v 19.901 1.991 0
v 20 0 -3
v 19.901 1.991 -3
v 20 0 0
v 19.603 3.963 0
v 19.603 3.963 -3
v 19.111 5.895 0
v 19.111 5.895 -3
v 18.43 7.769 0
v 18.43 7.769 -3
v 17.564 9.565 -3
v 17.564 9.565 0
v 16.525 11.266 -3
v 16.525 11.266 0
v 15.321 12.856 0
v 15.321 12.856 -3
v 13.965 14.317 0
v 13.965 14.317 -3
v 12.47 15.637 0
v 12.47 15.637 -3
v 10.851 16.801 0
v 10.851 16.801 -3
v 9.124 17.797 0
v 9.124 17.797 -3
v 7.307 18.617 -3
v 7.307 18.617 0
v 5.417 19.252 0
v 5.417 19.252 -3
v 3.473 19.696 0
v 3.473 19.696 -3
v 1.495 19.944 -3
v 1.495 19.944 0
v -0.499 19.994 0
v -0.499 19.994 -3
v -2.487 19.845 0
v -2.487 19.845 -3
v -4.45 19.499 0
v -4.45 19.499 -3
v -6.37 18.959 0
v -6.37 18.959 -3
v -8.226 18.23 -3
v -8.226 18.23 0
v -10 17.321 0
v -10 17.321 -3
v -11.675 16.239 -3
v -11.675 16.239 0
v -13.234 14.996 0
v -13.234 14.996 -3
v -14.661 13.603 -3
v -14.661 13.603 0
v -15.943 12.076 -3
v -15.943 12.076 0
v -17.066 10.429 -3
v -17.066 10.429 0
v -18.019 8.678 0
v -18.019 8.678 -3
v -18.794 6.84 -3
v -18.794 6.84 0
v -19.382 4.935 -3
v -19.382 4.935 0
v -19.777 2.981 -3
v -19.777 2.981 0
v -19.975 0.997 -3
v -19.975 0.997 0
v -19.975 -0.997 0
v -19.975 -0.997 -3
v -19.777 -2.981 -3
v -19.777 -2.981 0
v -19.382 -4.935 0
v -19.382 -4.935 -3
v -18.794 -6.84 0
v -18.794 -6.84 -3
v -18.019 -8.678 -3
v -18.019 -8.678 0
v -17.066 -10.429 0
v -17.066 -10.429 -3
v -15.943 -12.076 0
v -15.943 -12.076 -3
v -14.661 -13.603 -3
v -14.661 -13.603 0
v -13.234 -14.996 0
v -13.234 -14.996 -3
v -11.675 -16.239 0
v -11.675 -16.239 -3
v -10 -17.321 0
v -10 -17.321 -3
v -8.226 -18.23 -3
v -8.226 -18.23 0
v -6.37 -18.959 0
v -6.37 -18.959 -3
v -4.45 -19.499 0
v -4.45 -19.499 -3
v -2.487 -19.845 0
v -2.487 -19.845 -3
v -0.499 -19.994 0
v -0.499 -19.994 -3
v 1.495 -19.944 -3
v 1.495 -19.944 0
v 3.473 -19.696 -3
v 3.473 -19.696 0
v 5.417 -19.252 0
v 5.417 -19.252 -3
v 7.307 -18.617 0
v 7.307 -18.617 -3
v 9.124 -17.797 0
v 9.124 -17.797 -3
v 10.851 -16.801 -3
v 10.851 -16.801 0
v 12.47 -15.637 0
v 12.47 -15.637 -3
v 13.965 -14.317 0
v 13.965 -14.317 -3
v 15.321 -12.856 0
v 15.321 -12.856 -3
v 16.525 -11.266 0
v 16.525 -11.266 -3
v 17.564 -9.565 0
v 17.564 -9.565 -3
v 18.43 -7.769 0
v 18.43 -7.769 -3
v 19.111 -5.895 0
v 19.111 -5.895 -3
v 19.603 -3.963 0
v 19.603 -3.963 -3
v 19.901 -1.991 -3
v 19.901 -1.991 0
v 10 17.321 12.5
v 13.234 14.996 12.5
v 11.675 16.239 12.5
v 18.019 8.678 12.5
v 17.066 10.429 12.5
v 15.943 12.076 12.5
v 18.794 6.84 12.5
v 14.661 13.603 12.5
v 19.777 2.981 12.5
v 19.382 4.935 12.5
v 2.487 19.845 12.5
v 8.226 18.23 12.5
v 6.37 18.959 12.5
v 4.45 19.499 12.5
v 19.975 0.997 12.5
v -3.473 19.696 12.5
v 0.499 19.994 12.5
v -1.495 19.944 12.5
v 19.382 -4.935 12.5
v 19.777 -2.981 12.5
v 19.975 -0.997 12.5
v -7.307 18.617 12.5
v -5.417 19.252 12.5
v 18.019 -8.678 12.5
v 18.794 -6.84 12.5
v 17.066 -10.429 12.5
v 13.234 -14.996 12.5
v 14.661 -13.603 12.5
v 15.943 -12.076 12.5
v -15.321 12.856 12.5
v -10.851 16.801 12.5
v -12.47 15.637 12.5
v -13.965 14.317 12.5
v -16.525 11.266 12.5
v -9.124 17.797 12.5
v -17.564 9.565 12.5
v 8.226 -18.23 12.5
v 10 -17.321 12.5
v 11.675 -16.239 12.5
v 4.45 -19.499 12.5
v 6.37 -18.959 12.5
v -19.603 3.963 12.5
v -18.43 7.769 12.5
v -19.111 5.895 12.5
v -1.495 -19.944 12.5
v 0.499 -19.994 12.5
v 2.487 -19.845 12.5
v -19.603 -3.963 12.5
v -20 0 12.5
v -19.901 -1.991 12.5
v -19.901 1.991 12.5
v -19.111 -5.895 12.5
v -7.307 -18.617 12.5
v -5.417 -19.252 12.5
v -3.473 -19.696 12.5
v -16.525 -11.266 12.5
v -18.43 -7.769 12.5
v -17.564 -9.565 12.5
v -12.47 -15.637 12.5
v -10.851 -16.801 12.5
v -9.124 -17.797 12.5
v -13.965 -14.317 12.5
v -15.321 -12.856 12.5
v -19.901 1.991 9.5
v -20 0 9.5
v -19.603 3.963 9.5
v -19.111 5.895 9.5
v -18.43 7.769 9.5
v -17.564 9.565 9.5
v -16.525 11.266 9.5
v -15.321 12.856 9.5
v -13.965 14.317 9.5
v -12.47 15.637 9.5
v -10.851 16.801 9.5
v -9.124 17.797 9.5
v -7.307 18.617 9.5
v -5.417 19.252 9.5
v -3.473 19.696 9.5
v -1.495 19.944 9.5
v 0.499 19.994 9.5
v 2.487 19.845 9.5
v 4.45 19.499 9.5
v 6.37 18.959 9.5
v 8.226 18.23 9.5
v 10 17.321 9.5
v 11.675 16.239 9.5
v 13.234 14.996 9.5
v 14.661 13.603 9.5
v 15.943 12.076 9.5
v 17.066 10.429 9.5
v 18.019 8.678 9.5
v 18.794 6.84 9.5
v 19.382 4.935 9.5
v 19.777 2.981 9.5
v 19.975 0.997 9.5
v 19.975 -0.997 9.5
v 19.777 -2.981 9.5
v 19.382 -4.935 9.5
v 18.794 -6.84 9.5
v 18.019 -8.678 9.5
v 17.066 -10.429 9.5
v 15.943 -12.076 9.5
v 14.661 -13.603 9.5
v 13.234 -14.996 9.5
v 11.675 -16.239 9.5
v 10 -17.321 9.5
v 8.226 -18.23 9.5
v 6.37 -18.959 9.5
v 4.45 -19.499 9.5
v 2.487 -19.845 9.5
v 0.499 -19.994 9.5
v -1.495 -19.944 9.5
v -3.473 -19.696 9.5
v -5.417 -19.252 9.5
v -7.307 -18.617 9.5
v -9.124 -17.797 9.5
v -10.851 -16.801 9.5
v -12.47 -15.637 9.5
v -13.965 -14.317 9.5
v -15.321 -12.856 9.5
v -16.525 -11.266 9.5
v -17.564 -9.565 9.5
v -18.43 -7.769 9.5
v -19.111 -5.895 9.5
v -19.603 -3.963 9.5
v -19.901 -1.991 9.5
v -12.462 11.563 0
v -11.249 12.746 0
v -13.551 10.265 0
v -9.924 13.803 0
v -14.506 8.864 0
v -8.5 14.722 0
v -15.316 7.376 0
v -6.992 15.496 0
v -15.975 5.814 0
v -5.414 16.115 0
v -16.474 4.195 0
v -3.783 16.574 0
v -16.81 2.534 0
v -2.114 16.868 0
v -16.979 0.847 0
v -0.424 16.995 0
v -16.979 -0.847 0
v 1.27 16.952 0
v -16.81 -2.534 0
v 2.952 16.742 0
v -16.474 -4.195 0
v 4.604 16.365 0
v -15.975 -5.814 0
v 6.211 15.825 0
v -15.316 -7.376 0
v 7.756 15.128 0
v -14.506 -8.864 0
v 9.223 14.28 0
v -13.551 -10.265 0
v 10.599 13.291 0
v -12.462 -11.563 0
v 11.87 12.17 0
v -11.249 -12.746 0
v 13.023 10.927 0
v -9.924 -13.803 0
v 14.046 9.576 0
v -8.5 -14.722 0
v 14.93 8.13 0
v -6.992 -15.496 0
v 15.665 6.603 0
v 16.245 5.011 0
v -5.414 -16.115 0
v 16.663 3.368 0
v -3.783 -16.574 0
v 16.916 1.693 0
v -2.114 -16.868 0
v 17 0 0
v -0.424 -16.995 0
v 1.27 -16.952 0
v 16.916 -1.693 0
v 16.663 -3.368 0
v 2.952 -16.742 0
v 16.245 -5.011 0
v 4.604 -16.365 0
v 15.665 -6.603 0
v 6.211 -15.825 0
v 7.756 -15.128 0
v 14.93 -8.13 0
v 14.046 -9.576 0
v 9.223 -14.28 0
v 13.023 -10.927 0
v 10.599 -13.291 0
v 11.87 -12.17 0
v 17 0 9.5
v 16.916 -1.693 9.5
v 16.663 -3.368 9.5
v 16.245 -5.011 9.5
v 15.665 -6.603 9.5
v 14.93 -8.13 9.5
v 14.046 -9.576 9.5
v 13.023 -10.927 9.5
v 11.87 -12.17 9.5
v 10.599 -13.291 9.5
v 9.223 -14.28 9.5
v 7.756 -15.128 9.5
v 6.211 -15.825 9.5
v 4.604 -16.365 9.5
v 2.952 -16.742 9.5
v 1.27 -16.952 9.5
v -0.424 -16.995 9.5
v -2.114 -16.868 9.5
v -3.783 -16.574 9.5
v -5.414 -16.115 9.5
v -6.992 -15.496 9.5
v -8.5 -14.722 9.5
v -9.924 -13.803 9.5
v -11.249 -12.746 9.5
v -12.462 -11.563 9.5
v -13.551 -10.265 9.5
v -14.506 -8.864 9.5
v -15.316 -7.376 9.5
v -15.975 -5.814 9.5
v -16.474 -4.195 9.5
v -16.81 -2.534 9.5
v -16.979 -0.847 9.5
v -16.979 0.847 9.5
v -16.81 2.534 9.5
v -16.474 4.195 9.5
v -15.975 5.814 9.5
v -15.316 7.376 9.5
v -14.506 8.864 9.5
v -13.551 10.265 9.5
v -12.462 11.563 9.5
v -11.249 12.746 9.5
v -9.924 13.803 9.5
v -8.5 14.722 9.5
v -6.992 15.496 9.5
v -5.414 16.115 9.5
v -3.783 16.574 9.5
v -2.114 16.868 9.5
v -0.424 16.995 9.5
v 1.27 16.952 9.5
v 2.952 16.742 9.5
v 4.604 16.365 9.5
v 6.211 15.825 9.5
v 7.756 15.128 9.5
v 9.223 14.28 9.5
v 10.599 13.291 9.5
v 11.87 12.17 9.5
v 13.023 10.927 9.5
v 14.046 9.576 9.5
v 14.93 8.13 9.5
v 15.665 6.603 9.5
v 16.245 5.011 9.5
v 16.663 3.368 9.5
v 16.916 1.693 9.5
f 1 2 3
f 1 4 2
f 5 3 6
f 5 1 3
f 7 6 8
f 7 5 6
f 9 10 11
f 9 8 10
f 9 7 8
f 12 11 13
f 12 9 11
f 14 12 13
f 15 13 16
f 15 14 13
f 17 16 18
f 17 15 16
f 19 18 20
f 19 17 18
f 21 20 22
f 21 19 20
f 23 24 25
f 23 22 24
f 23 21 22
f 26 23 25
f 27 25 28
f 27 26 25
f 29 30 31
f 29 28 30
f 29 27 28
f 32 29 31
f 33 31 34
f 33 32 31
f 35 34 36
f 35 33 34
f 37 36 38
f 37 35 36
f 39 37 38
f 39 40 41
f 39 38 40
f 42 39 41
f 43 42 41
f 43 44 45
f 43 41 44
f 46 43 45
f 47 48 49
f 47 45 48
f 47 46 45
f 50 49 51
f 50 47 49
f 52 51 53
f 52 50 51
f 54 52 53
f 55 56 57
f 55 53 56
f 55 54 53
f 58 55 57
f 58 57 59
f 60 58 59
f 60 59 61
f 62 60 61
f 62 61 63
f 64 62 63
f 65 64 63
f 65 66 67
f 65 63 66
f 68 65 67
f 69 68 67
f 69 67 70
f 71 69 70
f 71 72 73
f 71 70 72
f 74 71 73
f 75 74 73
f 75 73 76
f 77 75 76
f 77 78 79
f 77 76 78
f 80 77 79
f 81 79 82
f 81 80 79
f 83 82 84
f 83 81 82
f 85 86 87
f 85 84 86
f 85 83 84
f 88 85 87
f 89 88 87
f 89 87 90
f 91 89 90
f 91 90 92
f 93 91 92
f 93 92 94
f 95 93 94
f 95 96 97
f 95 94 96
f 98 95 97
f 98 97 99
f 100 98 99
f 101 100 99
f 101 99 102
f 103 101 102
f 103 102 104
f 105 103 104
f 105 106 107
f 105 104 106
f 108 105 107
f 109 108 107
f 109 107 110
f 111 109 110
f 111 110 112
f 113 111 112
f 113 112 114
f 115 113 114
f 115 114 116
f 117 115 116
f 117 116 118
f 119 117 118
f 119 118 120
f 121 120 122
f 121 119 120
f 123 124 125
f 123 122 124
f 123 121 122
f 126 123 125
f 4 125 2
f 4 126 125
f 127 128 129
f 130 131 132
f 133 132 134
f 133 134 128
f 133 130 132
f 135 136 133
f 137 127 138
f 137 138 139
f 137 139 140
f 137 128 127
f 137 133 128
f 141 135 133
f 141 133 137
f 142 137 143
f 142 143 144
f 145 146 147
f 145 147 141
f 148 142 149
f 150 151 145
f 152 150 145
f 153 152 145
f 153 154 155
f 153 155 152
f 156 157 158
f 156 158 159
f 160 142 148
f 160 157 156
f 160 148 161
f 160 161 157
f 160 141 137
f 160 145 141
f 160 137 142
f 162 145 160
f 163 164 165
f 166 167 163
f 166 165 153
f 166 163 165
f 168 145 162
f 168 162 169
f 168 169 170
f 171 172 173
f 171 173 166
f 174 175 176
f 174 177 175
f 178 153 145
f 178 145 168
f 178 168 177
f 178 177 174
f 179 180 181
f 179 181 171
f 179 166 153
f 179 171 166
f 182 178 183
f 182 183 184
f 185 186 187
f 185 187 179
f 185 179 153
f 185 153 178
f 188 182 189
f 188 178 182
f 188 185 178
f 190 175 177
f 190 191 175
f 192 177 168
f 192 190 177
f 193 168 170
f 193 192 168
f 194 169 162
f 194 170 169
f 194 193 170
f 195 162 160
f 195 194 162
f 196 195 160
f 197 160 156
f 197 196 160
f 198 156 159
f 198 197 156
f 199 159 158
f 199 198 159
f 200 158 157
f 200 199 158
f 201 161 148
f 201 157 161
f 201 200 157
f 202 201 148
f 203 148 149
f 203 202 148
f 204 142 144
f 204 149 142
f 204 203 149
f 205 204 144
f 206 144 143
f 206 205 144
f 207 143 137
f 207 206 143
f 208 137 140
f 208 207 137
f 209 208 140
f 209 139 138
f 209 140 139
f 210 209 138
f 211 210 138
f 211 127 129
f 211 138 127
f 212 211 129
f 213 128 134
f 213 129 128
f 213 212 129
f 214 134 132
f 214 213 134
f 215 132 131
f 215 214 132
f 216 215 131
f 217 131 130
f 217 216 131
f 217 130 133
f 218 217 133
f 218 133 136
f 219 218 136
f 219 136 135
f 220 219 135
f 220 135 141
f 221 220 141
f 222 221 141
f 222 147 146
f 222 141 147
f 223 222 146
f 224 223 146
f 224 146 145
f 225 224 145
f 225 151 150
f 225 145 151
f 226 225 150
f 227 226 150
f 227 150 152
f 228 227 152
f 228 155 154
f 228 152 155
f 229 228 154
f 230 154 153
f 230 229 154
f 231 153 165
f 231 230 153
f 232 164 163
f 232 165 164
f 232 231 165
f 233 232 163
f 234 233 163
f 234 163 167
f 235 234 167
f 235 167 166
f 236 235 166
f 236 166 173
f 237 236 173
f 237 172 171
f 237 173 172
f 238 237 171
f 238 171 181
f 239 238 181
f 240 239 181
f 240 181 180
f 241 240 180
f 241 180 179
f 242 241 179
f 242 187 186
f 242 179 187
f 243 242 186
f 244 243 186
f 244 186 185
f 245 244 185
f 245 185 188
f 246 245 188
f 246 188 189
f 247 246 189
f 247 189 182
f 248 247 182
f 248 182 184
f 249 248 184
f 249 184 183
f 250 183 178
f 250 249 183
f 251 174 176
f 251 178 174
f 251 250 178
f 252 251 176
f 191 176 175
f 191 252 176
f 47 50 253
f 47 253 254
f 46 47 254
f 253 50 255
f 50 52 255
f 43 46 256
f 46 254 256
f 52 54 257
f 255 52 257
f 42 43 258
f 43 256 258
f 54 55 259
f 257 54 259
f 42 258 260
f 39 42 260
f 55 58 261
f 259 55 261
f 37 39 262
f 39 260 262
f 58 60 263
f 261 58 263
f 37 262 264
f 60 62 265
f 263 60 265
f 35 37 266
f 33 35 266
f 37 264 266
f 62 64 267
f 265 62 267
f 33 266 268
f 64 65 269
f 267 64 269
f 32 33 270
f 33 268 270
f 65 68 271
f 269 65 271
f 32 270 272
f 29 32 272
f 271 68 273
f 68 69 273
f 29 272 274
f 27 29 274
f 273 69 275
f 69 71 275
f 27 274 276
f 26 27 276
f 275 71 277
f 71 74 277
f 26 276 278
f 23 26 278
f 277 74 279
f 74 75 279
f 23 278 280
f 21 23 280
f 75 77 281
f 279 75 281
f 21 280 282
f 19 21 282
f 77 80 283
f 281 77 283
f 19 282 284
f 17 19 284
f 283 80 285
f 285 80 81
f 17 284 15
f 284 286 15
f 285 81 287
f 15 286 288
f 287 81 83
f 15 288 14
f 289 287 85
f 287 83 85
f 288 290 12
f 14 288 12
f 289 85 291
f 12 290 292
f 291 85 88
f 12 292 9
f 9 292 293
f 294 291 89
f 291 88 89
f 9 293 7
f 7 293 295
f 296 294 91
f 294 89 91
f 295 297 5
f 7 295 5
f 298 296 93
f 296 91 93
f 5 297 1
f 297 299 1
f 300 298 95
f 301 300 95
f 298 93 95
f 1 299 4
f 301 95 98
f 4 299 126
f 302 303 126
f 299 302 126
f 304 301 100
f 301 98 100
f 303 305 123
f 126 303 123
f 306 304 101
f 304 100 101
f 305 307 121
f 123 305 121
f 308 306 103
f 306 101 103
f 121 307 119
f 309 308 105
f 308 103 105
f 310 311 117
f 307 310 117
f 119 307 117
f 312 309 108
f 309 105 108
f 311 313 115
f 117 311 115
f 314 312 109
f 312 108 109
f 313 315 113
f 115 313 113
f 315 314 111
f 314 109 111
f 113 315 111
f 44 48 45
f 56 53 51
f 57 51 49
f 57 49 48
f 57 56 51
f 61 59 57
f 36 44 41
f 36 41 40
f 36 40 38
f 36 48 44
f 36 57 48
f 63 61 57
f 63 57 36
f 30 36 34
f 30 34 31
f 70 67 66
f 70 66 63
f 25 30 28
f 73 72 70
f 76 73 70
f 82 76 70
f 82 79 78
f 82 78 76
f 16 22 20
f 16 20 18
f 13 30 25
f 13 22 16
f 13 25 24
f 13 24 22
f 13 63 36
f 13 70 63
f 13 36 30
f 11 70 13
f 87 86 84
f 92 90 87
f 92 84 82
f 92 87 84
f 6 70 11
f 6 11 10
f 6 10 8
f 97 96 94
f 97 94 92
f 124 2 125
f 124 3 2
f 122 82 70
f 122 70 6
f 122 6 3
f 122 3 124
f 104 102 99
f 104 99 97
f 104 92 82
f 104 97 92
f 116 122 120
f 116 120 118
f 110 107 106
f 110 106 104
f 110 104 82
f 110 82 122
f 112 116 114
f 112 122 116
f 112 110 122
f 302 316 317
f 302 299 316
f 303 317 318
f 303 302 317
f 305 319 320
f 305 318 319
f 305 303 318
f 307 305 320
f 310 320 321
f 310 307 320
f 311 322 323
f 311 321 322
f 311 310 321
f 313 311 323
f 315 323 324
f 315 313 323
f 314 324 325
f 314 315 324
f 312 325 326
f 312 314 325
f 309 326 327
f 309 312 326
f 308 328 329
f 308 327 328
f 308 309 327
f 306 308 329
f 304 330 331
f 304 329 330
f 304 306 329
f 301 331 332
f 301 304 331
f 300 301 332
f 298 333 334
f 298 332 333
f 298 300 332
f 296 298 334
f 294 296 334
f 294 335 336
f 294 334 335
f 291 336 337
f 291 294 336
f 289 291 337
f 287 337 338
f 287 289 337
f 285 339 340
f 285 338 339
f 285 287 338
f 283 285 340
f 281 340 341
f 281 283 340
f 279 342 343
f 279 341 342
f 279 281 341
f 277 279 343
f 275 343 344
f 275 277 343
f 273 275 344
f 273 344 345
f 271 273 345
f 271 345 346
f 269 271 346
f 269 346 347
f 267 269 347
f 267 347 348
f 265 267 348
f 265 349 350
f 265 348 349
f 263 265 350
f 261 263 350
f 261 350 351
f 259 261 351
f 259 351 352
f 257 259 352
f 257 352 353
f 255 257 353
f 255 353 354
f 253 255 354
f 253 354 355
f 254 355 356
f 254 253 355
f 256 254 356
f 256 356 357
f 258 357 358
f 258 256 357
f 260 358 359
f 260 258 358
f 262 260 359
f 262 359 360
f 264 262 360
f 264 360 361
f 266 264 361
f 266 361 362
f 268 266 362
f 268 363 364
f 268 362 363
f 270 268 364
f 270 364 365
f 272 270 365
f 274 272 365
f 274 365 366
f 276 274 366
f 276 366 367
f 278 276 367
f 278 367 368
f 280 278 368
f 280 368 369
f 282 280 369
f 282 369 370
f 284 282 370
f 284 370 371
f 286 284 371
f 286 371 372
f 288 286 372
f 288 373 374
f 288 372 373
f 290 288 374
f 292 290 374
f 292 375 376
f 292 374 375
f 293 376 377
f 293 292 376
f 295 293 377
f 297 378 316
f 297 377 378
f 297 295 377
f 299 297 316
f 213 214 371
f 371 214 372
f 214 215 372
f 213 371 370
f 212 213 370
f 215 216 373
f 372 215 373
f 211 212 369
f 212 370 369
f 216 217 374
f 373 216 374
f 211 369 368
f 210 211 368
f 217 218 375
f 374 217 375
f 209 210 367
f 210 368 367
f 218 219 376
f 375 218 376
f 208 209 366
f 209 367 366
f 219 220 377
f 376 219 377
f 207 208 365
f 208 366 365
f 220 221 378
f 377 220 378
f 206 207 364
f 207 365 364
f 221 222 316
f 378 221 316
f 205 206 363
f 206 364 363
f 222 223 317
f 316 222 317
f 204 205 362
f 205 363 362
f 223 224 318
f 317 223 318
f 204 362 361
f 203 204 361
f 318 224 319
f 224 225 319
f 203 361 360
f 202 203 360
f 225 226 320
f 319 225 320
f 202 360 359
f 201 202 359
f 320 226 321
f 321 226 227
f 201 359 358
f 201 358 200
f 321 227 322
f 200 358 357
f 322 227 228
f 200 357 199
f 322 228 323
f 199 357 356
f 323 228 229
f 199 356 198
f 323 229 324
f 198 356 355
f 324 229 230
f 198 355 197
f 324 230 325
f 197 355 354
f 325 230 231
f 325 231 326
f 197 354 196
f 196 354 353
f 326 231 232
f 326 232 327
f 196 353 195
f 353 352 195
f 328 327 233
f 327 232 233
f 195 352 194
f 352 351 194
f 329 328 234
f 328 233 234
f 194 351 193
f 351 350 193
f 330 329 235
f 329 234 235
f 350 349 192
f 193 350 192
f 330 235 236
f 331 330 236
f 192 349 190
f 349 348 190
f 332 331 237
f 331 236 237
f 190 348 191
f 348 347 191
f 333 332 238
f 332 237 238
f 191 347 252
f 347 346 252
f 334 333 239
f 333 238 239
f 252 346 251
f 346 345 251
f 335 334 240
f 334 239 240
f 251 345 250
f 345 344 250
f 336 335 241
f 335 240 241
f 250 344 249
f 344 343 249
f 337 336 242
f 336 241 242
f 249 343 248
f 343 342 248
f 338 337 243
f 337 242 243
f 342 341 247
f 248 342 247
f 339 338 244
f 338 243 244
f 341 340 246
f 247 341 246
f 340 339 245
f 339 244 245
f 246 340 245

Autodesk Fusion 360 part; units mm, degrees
sketch "Skizze1" plane through (0, 0, 0) normal (0, 0, 1) x (1, 0, 0)
  circle A0 centre (0, 0) radius 17
  dimension "d1" = 34
extrude "Extrusion1" add sketch "Skizze1" along normal blind 9.5
sketch "Skizze2" plane through (0, 0, 9.5) normal (0, 0, 1) x (-1, 0, 0)
  circle A0 centre (0, 0) radius 17
  circle A1 centre (0, 0) radius 20
  dimension "d5" = 40
extrude "Extrusion2" add sketch "Skizze2" along normal blind 3 contours A0 | A1
sketch "Skizze3" plane through (0, 0, 0) normal (0, 0, -1) x (1, 0, 0)
  circle A0 centre (0, 0) radius 17
  circle A1 centre (0, 0) radius 20
  dimension "d8" = 40
extrude "Extrusion3" add sketch "Skizze3" along normal blind 3 contours A0 | A1
